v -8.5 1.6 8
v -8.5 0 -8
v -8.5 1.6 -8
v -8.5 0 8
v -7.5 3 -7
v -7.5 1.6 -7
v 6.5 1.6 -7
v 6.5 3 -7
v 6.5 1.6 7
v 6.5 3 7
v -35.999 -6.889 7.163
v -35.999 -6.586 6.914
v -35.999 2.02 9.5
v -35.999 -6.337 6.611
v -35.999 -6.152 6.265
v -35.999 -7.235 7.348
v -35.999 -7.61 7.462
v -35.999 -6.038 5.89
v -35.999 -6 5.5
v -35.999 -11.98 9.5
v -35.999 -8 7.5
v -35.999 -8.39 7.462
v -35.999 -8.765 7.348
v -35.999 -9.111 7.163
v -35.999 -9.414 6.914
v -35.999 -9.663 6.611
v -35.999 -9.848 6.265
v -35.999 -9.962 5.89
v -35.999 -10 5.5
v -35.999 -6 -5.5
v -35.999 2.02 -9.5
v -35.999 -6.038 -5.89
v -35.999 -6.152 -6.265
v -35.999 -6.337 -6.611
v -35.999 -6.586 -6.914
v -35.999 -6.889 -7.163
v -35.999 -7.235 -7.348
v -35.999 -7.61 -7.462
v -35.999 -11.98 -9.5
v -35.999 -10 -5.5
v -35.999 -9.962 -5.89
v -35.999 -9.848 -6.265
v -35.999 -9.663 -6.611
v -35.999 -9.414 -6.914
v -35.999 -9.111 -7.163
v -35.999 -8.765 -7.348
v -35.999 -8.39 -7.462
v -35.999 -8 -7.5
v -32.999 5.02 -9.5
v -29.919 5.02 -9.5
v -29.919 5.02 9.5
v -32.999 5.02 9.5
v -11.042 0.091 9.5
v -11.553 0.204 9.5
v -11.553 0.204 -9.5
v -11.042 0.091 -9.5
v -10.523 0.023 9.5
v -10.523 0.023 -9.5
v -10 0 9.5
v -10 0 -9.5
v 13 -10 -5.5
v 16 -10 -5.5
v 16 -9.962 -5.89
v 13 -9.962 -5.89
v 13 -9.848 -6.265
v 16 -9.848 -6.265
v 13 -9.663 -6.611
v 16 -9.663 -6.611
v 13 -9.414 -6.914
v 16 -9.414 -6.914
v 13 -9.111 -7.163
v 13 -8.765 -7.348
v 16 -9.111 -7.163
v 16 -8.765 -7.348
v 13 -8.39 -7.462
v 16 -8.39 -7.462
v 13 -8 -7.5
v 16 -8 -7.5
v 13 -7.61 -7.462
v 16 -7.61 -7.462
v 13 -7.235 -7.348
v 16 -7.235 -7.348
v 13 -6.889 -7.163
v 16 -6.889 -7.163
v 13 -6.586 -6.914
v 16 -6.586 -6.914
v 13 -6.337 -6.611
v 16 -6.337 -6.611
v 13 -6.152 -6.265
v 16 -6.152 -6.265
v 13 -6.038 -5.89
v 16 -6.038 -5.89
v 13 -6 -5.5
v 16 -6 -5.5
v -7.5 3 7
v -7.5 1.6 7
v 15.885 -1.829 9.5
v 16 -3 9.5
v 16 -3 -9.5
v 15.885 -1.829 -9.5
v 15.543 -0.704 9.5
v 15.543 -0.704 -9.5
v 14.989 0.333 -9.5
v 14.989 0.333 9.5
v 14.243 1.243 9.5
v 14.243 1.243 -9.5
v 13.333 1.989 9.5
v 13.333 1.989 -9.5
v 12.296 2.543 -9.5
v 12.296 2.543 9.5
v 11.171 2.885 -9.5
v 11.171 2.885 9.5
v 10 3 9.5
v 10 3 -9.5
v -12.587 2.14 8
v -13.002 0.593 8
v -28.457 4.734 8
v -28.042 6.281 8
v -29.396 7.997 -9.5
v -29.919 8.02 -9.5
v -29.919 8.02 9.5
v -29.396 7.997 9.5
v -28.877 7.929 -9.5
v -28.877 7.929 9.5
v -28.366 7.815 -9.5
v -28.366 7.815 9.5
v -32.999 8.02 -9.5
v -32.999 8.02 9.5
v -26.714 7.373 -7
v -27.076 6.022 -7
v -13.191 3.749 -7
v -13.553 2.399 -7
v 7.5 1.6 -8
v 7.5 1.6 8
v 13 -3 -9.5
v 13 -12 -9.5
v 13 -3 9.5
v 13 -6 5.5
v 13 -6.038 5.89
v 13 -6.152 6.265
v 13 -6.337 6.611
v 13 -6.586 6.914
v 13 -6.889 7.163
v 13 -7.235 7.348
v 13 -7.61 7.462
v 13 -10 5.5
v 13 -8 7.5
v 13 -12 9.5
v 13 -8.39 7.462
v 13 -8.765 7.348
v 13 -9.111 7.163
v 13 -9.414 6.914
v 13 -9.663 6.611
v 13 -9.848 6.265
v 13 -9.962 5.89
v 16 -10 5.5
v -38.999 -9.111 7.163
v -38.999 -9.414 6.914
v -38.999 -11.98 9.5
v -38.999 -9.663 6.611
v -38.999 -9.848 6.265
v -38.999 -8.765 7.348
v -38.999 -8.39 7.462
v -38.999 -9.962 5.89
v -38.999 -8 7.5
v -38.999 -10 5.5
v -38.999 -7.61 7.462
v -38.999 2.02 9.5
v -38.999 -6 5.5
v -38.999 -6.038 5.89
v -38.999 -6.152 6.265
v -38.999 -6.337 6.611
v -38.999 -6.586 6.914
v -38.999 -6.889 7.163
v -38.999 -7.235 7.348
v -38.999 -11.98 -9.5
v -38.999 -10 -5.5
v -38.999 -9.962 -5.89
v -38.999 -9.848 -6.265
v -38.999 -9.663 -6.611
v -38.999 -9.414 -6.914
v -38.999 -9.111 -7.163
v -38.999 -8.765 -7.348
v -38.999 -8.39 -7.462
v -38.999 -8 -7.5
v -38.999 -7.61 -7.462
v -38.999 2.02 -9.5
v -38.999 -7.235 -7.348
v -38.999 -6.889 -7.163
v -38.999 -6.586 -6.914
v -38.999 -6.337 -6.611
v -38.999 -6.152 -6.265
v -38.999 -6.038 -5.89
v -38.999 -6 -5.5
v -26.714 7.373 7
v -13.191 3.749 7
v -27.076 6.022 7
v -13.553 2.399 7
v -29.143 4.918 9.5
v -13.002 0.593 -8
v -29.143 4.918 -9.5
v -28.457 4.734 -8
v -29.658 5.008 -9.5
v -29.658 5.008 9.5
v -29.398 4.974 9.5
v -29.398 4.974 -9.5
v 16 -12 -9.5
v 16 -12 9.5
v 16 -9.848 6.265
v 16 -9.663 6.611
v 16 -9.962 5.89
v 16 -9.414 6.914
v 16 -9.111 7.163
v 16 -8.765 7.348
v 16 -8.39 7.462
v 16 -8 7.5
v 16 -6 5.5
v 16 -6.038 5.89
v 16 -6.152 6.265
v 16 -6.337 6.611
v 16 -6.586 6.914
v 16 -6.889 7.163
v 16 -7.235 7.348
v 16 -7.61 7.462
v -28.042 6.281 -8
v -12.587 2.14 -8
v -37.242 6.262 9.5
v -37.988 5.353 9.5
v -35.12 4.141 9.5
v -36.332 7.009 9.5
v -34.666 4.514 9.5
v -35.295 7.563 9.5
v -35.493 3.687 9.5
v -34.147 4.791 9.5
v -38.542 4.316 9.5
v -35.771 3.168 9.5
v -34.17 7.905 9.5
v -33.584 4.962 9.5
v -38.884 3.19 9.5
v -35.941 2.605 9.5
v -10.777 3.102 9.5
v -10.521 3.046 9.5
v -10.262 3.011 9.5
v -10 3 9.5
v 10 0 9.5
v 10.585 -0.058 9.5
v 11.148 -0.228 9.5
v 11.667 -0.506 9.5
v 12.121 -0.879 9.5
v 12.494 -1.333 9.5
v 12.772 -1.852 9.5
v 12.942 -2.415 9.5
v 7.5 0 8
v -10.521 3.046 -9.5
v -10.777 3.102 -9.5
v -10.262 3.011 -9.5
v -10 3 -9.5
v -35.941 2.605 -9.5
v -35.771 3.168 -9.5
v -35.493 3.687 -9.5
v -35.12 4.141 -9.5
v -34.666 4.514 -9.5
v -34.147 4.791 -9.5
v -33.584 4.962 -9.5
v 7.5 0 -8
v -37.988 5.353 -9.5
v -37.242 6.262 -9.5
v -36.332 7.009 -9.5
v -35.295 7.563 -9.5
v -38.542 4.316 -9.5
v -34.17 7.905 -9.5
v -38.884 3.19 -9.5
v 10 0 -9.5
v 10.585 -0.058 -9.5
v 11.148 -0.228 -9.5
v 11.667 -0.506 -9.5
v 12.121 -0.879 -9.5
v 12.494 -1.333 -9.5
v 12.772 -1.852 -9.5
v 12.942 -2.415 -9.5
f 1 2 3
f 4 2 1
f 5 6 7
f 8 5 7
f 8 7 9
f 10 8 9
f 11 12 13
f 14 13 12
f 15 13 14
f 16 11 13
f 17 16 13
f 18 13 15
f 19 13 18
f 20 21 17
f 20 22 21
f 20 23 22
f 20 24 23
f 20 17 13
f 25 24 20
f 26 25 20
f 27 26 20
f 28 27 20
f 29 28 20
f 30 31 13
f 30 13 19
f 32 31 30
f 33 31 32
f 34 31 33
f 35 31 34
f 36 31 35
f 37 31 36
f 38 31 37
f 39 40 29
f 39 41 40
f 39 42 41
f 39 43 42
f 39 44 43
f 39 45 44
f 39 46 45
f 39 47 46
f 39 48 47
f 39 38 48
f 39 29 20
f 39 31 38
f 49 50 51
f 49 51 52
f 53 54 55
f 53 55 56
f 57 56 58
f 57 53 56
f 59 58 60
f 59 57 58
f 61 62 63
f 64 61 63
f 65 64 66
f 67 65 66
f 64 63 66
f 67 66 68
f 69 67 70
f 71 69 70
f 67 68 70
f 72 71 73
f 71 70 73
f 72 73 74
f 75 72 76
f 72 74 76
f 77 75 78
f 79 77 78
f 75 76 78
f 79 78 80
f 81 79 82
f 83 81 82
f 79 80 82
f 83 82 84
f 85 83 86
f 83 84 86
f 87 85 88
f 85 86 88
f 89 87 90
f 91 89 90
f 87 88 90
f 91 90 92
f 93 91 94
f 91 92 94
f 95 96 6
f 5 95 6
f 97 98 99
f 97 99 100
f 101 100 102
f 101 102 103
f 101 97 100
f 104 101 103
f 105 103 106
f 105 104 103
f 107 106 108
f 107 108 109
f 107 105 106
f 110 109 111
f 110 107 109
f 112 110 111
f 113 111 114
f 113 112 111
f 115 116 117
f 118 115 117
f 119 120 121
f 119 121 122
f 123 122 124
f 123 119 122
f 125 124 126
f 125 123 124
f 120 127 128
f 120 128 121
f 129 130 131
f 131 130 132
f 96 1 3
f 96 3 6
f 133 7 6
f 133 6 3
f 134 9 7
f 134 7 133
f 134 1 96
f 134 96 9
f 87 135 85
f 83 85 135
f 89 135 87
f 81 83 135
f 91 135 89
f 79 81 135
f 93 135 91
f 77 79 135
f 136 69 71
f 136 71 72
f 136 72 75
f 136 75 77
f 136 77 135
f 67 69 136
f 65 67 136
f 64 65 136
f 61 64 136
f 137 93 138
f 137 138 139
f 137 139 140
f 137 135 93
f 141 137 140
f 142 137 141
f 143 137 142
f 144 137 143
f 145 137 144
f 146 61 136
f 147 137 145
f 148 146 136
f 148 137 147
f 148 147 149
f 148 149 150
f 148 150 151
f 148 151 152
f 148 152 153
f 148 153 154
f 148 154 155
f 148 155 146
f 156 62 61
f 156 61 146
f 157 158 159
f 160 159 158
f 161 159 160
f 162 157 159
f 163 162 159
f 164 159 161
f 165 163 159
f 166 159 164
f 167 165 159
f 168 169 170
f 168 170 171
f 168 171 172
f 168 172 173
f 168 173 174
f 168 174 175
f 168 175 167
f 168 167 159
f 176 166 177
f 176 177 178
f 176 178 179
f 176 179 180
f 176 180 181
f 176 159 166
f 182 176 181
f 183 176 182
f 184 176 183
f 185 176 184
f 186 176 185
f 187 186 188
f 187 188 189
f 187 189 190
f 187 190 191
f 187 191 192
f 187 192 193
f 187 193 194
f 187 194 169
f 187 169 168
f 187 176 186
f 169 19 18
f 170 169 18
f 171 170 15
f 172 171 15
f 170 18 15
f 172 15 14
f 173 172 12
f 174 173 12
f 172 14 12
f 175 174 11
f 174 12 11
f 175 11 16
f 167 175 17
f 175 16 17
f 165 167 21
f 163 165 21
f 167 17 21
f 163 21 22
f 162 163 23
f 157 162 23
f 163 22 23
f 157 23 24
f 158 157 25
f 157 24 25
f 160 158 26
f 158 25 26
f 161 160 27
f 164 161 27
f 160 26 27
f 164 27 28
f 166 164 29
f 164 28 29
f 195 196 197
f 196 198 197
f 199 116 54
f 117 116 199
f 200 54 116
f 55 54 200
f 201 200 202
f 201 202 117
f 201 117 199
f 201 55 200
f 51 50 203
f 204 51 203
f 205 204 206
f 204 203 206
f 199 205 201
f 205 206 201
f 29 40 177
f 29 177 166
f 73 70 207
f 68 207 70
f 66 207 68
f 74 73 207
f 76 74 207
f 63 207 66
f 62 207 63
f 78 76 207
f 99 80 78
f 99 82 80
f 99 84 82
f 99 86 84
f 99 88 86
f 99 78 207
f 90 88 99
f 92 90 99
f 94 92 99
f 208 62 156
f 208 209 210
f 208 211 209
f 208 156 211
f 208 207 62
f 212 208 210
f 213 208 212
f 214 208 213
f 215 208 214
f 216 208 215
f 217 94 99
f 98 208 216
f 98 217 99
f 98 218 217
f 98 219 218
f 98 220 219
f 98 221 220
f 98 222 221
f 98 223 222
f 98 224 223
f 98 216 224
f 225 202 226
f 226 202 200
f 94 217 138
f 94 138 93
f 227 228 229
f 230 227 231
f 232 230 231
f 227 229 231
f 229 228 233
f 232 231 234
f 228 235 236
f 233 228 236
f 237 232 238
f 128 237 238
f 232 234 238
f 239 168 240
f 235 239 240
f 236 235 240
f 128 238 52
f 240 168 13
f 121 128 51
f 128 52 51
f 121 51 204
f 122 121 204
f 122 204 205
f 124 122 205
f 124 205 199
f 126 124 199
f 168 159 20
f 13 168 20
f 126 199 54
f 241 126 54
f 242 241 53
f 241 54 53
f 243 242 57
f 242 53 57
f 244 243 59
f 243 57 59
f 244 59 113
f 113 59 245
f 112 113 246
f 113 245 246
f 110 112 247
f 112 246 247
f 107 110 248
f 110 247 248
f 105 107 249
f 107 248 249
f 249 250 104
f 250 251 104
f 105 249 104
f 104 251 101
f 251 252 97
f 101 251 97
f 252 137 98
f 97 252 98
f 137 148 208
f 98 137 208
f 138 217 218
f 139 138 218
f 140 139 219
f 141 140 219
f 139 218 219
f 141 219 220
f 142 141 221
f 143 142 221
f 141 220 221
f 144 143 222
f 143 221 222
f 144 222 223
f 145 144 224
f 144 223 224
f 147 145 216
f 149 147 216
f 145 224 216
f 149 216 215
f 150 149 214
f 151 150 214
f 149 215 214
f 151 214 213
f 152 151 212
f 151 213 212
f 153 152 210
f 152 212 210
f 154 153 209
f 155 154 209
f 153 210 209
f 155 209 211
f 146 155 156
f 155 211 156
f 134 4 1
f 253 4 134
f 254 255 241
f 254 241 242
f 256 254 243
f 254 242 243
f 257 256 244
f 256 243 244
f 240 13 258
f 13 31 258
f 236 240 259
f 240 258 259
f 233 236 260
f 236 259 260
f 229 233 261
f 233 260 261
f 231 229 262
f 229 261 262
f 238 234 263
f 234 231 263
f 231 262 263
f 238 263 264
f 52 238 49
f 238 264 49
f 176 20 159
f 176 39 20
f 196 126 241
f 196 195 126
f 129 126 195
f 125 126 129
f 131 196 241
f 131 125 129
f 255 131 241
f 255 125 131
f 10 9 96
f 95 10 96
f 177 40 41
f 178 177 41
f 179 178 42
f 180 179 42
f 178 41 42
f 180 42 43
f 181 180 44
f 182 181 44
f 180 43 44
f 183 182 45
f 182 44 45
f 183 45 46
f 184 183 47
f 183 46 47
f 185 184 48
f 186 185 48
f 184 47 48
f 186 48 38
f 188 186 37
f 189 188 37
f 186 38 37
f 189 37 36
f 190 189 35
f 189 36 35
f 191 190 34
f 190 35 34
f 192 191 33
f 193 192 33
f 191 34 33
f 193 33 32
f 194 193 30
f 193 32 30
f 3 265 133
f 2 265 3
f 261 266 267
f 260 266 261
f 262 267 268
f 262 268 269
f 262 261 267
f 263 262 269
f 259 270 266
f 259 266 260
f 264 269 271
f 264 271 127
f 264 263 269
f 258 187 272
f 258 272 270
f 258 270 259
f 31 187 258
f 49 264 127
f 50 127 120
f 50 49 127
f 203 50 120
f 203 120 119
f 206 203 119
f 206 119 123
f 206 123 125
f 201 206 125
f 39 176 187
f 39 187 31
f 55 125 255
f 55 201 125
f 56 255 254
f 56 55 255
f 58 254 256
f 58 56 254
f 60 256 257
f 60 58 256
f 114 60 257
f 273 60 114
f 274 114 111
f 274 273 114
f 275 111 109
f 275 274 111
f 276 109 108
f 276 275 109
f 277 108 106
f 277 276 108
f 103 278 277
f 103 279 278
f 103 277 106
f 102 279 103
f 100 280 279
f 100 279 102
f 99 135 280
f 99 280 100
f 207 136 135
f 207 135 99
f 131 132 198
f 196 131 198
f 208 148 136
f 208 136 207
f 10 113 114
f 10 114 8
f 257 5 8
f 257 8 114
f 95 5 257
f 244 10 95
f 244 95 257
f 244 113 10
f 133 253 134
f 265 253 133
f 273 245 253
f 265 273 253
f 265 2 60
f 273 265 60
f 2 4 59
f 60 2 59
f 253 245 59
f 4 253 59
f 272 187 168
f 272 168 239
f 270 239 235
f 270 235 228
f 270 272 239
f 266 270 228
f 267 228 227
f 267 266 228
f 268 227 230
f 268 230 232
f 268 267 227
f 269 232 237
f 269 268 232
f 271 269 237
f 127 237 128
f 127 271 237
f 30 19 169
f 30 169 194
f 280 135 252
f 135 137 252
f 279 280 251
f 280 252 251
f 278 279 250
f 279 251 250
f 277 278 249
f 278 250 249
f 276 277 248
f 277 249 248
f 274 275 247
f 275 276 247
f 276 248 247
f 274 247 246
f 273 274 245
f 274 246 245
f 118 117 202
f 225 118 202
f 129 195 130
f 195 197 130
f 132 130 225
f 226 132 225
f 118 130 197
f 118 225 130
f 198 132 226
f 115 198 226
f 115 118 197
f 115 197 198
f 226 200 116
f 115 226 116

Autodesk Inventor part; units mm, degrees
ref_plane "YZ Plane" through (0, 0, 0) normal (1, 0, 0) x (0, 1, 0)
ref_plane "XZ Plane" through (0, 0, 0) normal (0, 1, 0) x (-1, 0, 0)
ref_plane "XY Plane" through (0, 0, 0) normal (0, 0, 1) x (1, 0, 0)
sketch "スケッチ1" plane through (0, 0, 0) normal (0, 1, 0) x (-1, 0, 0)
  line L0 (-10, -9.5) -> (10, -9.5)
  line L1 (10, -9.5) -> (10, 9.5)
  line L2 (10, 9.5) -> (-10, 9.5)
  line L3 (-10, 9.5) -> (-10, -9.5)
  line L4 (-10, -9.5) -> (10, 9.5) construction
  line L5 (10, -9.5) -> (-10, 9.5) construction
  point P0 (0, 0)
  dimension "d0" = 20
  dimension "d1" = 19
extrude "プレート1" add sketch "スケッチ1" along normal blind 3
sketch "スケッチ5" plane through (0, 3, 0) normal (0, 1, 0) x (1, 0, 0)
  point P0 (0, 0)
sketch "スケッチ6" plane through (-10.7765, 3.1022, 9.5) normal (-0.258819, -0.9659258, 0) x (0.9659258, -0.258819, 0)
  line L0 (0, -19) -> (0, 0)
  line L1 (0, 0) -> (-18.2101, 0)
  line L2 (-18.2101, 0) -> (-18.2101, -19)
  line L3 (-18.2101, -19) -> (0, -19)
edge flange "フランジ3" height 19 angle 15 thickness 3 bend radius 3 thickness toward (-0.258819, -0.9659258, 0) relief tear relief width 3 relief depth 1.5 edges at (-10, 3, 0) wall of the first edge with corners at (-10.7765, 3.1022, -9.5) (-10.7765, 3.1022, 9.5) (-28.366, 7.8153, 9.5) (-28.366, 7.8153, -9.5)
bend "曲げ3"
corner "コーナー3"
sketch "スケッチ7" plane through (-29.919, 5.0198, 9.5) normal (0, 1, 0) x (1, 0, 0)
  line L0 (0, -19) -> (0, 0)
  line L1 (0, 0) -> (-3.0801, 0)
  line L2 (-3.0801, 0) -> (-3.0801, -19)
  line L3 (-3.0801, -19) -> (0, -19)
edge flange "フランジ4" height 3.87 angle -15 thickness 3 bend radius 3 thickness toward (0, 1, 0) relief tear relief width 3 relief depth 1.5 edges at (-28.366, 7.8153, 0) wall of the first edge with corners at (-29.919, 5.0198, -9.5) (-29.919, 5.0198, 9.5) (-32.999, 5.0198, 9.5) (-32.999, 5.0198, -9.5)
bend "曲げ4"
corner "コーナー4"
sketch "スケッチ8" plane through (13, -3, -9.5) normal (1, 0, 0) x (0, -1, 0)
  line L0 (0, 19) -> (0, 0)
  line L1 (0, 0) -> (9, 0)
  line L2 (9, 0) -> (9, 19)
  line L3 (9, 19) -> (0, 19)
edge flange "フランジ5" height 15 angle -90 thickness 3 bend radius 3 thickness toward (1, 0, 0) relief tear relief width 3 relief depth 1.5 edges at (10, 3, 0) wall of the first edge with corners at (13, -3, 9.5) (13, -3, -9.5) (13, -12, -9.5) (13, -12, 9.5)
bend "曲げ5"
corner "コーナー5"
sketch "スケッチ9" plane through (-35.999, 2.0198, 9.5) normal (-1, 0, 0) x (0, 1, 0)
  line L0 (0, -19) -> (0, 0)
  line L1 (0, 0) -> (-14, 0)
  line L2 (-14, 0) -> (-14, -19)
  line L3 (-14, -19) -> (0, -19)
edge flange "フランジ6" height 20 angle -90 thickness 3 bend radius 3 thickness toward (-1, 0, 0) relief tear relief width 3 relief depth 1.5 edges at (-32.999, 8.0198, 0) wall of the first edge with corners at (-35.999, 2.0198, -9.5) (-35.999, 2.0198, 9.5) (-35.999, -11.9802, 9.5) (-35.999, -11.9802, -9.5)
bend "曲げ6"
corner "コーナー6"
sketch "スケッチ14" plane through (16, -12, 9.5) normal (1, 0, 0) x (0, 0, -1)
  line L0 (4, 6) -> (15, 6)
  arc A0 (15, 2) -> (15, 6) centre (15, 4) ccw
  line L1 (15, 2) -> (4, 2)
  arc A1 (4, 6) -> (4, 2) centre (4, 4) ccw
  line L2 (19, 9) -> (19, 0) projected
  line L3 (0, 9) -> (0, 0) projected
  line L4 (0, 0) -> (19, 0) projected
  point P0 (9.5, 12)
  dimension "d86" = 2
  dimension "d87" = 4
  dimension "d88" = 4
  dimension "d89" = 4
extrude "押し出し6" cut sketch "スケッチ14" against normal blind 100
sketch "スケッチ15" plane through (0, 0, 0) normal (0, -1, 0) x (1, 0, 0)
  line L0 (7.5, -8) -> (-8.5, -8)
  line L1 (-8.5, -8) -> (-8.5, 8)
  line L2 (-8.5, 8) -> (7.5, 8)
  line L3 (7.5, 8) -> (7.5, -8)
  line L4 (7.5, -8) -> (-8.5, 8) construction
  line L5 (-8.5, -8) -> (7.5, 8) construction
  line L6 (-10, -9.5) -> (-10, 9.5) projected
  point P0 (0, 0)
  point P1 (-0.5, 0)
  point P2 (-0.5, 0)
  dimension "d92" = 16
  dimension "d93" = 16
  dimension "d94" = 9.5
extrude "押し出し7" cut sketch "スケッチ15" against normal blind 1.6
sketch "スケッチ16" plane through (0, 1.6, 0) normal (0, -1, 0) x (1, 0, 0)
  line L0 (-7.5, -7) -> (6.5, -7)
  line L1 (6.5, -7) -> (6.5, 7)
  line L2 (6.5, 7) -> (-7.5, 7)
  line L3 (-7.5, 7) -> (-7.5, -7)
  line L4 (-7.5, -7) -> (6.5, 7) construction
  line L5 (6.5, -7) -> (-7.5, 7) construction
  line L6 (7.5, -8) -> (-8.5, -8) projected
  line L7 (7.5, 8) -> (7.5, -8) projected
  point P0 (0, 0)
  point P1 (-0.5, 0)
  point P2 (-0.5, 0)
  point P3 (-0.5, -8)
  point P4 (7.5, 0)
  dimension "d97" = 14
  dimension "d98" = 14
extrude "押し出し8" cut sketch "スケッチ16" against normal blind 1.4
sketch "スケッチ17" plane through (-11.5529, 0.2044, -9.5) normal (-0.258819, -0.9659258, 0) x (0.9659258, -0.258819, 0)
  line L0 (-17.5, 1.5) -> (-1.5, 1.5)
  line L1 (-1.5, 1.5) -> (-1.5, 17.5)
  line L2 (-1.5, 17.5) -> (-17.5, 17.5)
  line L3 (-17.5, 17.5) -> (-17.5, 1.5)
  line L4 (-17.5, 1.5) -> (-1.5, 17.5) construction
  line L5 (-1.5, 1.5) -> (-17.5, 17.5) construction
  line L6 (0, 0) -> (0, 19) projected
  point P0 (11.2122, 9.5)
  point P1 (-9.5, 9.5)
  point P2 (-9.5, 9.5)
  point P3 (0, 9.5)
  dimension "d101" = 16
  dimension "d102" = 16
  dimension "d103" = 9.5
extrude "押し出し9" cut sketch "スケッチ17" against normal blind 1.6
sketch "スケッチ18" plane through (-11.1388, 1.7499, -9.5) normal (-0.258819, -0.9659258, 0) x (0.9659258, -0.258819, 0)
  line L0 (-16.5, 2.5) -> (-2.5, 2.5)
  line L1 (-2.5, 2.5) -> (-2.5, 16.5)
  line L2 (-2.5, 16.5) -> (-16.5, 16.5)
  line L3 (-16.5, 16.5) -> (-16.5, 2.5)
  line L4 (-16.5, 2.5) -> (-2.5, 16.5) construction
  line L5 (-2.5, 2.5) -> (-16.5, 16.5) construction
  line L6 (-1.5, 17.5) -> (-1.5, 1.5) projected
  line L7 (-18.2101, 0) -> (0, 0) projected
  line L8 (-1.5, 1.5) -> (-17.5, 1.5) projected
  point P0 (11.2122, 9.5)
  point P1 (-9.5, 9.5)
  point P2 (-9.5, 9.5)
  point P3 (-1.5, 9.5)
  point P4 (-9.5, 9.5)
  point P5 (-9.5, 16.5)
  point P6 (-9.105, 0)
  point P7 (-9.5, 1.5)
  dimension "d106" = 14
  dimension "d107" = 14
extrude "押し出し10" cut sketch "スケッチ18" against normal blind 1.4
equation "\"d2\" = Thickness"
equation "\"d29\" = BendReliefWidth"
equation "\"d30\" = BendReliefDepth"
equation "\"d31\" = MinimumRemnant"
equation "\"d32\" = TransitionRadius"
equation "\"d35\" = BendRadius"
equation "\"d36\" = CornerReliefSize"
equation "\"d37\" = GapSize"
equation "\"d38\" = JacobiRadiusSize"
equation "\"d39\" = BendReliefWidth"
equation "\"d40\" = BendReliefDepth"
equation "\"d41\" = MinimumRemnant"
equation "\"d42\" = TransitionRadius"
equation "\"d45\" = BendRadius"
equation "\"d46\" = CornerReliefSize"
equation "\"d47\" = GapSize"
equation "\"d48\" = JacobiRadiusSize"
equation "\"d49\" = BendReliefWidth"
equation "\"d50\" = BendReliefDepth"
equation "\"d51\" = MinimumRemnant"
equation "\"d52\" = TransitionRadius"
equation "\"d55\" = BendRadius"
equation "\"d56\" = CornerReliefSize"
equation "\"d57\" = GapSize"
equation "\"d58\" = JacobiRadiusSize"
equation "\"d59\" = BendReliefWidth"
equation "\"d60\" = BendReliefDepth"
equation "\"d61\" = MinimumRemnant"
equation "\"d62\" = TransitionRadius"
equation "\"d65\" = BendRadius"
equation "\"d66\" = CornerReliefSize"
equation "\"d67\" = GapSize"
equation "\"d68\" = JacobiRadiusSize"
equation "\"BendRadius\" = Thickness"
equation "\"BendReliefWidth\" = Thickness"
equation "\"BendReliefDepth\" = 0.5 * Thickness"
equation "\"CornerReliefSize\" = 4 * Thickness"
equation "\"MinimumRemnant\" = 2 * Thickness"
equation "\"TransitionRadius\" = BendRadius"
equation "\"JacobiRadiusSize\" = BendRadius"
equation "\"GapSize\" = Thickness"
equation "\"Thickness\" = 3"
properties part number "thumbkey_plate" material "アルミニウム 6061"
